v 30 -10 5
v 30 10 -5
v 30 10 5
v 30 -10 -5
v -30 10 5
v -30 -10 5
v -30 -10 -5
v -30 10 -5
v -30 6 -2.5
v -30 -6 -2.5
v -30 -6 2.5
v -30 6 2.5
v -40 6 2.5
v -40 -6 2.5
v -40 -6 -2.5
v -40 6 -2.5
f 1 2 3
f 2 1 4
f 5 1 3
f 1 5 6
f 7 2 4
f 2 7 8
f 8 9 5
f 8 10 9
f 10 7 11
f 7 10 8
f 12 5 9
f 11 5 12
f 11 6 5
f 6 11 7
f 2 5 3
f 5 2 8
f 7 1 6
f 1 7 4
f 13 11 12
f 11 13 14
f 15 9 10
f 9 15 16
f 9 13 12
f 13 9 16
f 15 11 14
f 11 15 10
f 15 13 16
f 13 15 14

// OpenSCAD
// Parameters for the USB Disk
length = 60; // Length of the USB Disk
width = 20;  // Width of the USB Disk
height = 10; // Height of the USB Disk

// Parameters for the USB Connector
conn_length = 70; // Length of the Connector
conn_width = 12;  // Width of the Connector
conn_height = 5;  // Height of the Connector

module usb_disk() {
    difference() {
        // Body of the USB Disk, centered around the origin
        translate([-length/2, -width/2, -height/2])
        cube([length, width, height]);

        // Hollow space for the USB Connector
        translate([-conn_length/2, -conn_width/2, -conn_height/2])
        cube([conn_length, conn_width, conn_height]);
    }
}

module usb_connector() {
    // USB Connector part, positioned relative to the disk body
    translate([length/2 - conn_length, -conn_width/2, -conn_height/2])
    cube([conn_length, conn_width, conn_height]);
}

// Combine the USB disk body and the connector
usb_disk();
usb_connector();
